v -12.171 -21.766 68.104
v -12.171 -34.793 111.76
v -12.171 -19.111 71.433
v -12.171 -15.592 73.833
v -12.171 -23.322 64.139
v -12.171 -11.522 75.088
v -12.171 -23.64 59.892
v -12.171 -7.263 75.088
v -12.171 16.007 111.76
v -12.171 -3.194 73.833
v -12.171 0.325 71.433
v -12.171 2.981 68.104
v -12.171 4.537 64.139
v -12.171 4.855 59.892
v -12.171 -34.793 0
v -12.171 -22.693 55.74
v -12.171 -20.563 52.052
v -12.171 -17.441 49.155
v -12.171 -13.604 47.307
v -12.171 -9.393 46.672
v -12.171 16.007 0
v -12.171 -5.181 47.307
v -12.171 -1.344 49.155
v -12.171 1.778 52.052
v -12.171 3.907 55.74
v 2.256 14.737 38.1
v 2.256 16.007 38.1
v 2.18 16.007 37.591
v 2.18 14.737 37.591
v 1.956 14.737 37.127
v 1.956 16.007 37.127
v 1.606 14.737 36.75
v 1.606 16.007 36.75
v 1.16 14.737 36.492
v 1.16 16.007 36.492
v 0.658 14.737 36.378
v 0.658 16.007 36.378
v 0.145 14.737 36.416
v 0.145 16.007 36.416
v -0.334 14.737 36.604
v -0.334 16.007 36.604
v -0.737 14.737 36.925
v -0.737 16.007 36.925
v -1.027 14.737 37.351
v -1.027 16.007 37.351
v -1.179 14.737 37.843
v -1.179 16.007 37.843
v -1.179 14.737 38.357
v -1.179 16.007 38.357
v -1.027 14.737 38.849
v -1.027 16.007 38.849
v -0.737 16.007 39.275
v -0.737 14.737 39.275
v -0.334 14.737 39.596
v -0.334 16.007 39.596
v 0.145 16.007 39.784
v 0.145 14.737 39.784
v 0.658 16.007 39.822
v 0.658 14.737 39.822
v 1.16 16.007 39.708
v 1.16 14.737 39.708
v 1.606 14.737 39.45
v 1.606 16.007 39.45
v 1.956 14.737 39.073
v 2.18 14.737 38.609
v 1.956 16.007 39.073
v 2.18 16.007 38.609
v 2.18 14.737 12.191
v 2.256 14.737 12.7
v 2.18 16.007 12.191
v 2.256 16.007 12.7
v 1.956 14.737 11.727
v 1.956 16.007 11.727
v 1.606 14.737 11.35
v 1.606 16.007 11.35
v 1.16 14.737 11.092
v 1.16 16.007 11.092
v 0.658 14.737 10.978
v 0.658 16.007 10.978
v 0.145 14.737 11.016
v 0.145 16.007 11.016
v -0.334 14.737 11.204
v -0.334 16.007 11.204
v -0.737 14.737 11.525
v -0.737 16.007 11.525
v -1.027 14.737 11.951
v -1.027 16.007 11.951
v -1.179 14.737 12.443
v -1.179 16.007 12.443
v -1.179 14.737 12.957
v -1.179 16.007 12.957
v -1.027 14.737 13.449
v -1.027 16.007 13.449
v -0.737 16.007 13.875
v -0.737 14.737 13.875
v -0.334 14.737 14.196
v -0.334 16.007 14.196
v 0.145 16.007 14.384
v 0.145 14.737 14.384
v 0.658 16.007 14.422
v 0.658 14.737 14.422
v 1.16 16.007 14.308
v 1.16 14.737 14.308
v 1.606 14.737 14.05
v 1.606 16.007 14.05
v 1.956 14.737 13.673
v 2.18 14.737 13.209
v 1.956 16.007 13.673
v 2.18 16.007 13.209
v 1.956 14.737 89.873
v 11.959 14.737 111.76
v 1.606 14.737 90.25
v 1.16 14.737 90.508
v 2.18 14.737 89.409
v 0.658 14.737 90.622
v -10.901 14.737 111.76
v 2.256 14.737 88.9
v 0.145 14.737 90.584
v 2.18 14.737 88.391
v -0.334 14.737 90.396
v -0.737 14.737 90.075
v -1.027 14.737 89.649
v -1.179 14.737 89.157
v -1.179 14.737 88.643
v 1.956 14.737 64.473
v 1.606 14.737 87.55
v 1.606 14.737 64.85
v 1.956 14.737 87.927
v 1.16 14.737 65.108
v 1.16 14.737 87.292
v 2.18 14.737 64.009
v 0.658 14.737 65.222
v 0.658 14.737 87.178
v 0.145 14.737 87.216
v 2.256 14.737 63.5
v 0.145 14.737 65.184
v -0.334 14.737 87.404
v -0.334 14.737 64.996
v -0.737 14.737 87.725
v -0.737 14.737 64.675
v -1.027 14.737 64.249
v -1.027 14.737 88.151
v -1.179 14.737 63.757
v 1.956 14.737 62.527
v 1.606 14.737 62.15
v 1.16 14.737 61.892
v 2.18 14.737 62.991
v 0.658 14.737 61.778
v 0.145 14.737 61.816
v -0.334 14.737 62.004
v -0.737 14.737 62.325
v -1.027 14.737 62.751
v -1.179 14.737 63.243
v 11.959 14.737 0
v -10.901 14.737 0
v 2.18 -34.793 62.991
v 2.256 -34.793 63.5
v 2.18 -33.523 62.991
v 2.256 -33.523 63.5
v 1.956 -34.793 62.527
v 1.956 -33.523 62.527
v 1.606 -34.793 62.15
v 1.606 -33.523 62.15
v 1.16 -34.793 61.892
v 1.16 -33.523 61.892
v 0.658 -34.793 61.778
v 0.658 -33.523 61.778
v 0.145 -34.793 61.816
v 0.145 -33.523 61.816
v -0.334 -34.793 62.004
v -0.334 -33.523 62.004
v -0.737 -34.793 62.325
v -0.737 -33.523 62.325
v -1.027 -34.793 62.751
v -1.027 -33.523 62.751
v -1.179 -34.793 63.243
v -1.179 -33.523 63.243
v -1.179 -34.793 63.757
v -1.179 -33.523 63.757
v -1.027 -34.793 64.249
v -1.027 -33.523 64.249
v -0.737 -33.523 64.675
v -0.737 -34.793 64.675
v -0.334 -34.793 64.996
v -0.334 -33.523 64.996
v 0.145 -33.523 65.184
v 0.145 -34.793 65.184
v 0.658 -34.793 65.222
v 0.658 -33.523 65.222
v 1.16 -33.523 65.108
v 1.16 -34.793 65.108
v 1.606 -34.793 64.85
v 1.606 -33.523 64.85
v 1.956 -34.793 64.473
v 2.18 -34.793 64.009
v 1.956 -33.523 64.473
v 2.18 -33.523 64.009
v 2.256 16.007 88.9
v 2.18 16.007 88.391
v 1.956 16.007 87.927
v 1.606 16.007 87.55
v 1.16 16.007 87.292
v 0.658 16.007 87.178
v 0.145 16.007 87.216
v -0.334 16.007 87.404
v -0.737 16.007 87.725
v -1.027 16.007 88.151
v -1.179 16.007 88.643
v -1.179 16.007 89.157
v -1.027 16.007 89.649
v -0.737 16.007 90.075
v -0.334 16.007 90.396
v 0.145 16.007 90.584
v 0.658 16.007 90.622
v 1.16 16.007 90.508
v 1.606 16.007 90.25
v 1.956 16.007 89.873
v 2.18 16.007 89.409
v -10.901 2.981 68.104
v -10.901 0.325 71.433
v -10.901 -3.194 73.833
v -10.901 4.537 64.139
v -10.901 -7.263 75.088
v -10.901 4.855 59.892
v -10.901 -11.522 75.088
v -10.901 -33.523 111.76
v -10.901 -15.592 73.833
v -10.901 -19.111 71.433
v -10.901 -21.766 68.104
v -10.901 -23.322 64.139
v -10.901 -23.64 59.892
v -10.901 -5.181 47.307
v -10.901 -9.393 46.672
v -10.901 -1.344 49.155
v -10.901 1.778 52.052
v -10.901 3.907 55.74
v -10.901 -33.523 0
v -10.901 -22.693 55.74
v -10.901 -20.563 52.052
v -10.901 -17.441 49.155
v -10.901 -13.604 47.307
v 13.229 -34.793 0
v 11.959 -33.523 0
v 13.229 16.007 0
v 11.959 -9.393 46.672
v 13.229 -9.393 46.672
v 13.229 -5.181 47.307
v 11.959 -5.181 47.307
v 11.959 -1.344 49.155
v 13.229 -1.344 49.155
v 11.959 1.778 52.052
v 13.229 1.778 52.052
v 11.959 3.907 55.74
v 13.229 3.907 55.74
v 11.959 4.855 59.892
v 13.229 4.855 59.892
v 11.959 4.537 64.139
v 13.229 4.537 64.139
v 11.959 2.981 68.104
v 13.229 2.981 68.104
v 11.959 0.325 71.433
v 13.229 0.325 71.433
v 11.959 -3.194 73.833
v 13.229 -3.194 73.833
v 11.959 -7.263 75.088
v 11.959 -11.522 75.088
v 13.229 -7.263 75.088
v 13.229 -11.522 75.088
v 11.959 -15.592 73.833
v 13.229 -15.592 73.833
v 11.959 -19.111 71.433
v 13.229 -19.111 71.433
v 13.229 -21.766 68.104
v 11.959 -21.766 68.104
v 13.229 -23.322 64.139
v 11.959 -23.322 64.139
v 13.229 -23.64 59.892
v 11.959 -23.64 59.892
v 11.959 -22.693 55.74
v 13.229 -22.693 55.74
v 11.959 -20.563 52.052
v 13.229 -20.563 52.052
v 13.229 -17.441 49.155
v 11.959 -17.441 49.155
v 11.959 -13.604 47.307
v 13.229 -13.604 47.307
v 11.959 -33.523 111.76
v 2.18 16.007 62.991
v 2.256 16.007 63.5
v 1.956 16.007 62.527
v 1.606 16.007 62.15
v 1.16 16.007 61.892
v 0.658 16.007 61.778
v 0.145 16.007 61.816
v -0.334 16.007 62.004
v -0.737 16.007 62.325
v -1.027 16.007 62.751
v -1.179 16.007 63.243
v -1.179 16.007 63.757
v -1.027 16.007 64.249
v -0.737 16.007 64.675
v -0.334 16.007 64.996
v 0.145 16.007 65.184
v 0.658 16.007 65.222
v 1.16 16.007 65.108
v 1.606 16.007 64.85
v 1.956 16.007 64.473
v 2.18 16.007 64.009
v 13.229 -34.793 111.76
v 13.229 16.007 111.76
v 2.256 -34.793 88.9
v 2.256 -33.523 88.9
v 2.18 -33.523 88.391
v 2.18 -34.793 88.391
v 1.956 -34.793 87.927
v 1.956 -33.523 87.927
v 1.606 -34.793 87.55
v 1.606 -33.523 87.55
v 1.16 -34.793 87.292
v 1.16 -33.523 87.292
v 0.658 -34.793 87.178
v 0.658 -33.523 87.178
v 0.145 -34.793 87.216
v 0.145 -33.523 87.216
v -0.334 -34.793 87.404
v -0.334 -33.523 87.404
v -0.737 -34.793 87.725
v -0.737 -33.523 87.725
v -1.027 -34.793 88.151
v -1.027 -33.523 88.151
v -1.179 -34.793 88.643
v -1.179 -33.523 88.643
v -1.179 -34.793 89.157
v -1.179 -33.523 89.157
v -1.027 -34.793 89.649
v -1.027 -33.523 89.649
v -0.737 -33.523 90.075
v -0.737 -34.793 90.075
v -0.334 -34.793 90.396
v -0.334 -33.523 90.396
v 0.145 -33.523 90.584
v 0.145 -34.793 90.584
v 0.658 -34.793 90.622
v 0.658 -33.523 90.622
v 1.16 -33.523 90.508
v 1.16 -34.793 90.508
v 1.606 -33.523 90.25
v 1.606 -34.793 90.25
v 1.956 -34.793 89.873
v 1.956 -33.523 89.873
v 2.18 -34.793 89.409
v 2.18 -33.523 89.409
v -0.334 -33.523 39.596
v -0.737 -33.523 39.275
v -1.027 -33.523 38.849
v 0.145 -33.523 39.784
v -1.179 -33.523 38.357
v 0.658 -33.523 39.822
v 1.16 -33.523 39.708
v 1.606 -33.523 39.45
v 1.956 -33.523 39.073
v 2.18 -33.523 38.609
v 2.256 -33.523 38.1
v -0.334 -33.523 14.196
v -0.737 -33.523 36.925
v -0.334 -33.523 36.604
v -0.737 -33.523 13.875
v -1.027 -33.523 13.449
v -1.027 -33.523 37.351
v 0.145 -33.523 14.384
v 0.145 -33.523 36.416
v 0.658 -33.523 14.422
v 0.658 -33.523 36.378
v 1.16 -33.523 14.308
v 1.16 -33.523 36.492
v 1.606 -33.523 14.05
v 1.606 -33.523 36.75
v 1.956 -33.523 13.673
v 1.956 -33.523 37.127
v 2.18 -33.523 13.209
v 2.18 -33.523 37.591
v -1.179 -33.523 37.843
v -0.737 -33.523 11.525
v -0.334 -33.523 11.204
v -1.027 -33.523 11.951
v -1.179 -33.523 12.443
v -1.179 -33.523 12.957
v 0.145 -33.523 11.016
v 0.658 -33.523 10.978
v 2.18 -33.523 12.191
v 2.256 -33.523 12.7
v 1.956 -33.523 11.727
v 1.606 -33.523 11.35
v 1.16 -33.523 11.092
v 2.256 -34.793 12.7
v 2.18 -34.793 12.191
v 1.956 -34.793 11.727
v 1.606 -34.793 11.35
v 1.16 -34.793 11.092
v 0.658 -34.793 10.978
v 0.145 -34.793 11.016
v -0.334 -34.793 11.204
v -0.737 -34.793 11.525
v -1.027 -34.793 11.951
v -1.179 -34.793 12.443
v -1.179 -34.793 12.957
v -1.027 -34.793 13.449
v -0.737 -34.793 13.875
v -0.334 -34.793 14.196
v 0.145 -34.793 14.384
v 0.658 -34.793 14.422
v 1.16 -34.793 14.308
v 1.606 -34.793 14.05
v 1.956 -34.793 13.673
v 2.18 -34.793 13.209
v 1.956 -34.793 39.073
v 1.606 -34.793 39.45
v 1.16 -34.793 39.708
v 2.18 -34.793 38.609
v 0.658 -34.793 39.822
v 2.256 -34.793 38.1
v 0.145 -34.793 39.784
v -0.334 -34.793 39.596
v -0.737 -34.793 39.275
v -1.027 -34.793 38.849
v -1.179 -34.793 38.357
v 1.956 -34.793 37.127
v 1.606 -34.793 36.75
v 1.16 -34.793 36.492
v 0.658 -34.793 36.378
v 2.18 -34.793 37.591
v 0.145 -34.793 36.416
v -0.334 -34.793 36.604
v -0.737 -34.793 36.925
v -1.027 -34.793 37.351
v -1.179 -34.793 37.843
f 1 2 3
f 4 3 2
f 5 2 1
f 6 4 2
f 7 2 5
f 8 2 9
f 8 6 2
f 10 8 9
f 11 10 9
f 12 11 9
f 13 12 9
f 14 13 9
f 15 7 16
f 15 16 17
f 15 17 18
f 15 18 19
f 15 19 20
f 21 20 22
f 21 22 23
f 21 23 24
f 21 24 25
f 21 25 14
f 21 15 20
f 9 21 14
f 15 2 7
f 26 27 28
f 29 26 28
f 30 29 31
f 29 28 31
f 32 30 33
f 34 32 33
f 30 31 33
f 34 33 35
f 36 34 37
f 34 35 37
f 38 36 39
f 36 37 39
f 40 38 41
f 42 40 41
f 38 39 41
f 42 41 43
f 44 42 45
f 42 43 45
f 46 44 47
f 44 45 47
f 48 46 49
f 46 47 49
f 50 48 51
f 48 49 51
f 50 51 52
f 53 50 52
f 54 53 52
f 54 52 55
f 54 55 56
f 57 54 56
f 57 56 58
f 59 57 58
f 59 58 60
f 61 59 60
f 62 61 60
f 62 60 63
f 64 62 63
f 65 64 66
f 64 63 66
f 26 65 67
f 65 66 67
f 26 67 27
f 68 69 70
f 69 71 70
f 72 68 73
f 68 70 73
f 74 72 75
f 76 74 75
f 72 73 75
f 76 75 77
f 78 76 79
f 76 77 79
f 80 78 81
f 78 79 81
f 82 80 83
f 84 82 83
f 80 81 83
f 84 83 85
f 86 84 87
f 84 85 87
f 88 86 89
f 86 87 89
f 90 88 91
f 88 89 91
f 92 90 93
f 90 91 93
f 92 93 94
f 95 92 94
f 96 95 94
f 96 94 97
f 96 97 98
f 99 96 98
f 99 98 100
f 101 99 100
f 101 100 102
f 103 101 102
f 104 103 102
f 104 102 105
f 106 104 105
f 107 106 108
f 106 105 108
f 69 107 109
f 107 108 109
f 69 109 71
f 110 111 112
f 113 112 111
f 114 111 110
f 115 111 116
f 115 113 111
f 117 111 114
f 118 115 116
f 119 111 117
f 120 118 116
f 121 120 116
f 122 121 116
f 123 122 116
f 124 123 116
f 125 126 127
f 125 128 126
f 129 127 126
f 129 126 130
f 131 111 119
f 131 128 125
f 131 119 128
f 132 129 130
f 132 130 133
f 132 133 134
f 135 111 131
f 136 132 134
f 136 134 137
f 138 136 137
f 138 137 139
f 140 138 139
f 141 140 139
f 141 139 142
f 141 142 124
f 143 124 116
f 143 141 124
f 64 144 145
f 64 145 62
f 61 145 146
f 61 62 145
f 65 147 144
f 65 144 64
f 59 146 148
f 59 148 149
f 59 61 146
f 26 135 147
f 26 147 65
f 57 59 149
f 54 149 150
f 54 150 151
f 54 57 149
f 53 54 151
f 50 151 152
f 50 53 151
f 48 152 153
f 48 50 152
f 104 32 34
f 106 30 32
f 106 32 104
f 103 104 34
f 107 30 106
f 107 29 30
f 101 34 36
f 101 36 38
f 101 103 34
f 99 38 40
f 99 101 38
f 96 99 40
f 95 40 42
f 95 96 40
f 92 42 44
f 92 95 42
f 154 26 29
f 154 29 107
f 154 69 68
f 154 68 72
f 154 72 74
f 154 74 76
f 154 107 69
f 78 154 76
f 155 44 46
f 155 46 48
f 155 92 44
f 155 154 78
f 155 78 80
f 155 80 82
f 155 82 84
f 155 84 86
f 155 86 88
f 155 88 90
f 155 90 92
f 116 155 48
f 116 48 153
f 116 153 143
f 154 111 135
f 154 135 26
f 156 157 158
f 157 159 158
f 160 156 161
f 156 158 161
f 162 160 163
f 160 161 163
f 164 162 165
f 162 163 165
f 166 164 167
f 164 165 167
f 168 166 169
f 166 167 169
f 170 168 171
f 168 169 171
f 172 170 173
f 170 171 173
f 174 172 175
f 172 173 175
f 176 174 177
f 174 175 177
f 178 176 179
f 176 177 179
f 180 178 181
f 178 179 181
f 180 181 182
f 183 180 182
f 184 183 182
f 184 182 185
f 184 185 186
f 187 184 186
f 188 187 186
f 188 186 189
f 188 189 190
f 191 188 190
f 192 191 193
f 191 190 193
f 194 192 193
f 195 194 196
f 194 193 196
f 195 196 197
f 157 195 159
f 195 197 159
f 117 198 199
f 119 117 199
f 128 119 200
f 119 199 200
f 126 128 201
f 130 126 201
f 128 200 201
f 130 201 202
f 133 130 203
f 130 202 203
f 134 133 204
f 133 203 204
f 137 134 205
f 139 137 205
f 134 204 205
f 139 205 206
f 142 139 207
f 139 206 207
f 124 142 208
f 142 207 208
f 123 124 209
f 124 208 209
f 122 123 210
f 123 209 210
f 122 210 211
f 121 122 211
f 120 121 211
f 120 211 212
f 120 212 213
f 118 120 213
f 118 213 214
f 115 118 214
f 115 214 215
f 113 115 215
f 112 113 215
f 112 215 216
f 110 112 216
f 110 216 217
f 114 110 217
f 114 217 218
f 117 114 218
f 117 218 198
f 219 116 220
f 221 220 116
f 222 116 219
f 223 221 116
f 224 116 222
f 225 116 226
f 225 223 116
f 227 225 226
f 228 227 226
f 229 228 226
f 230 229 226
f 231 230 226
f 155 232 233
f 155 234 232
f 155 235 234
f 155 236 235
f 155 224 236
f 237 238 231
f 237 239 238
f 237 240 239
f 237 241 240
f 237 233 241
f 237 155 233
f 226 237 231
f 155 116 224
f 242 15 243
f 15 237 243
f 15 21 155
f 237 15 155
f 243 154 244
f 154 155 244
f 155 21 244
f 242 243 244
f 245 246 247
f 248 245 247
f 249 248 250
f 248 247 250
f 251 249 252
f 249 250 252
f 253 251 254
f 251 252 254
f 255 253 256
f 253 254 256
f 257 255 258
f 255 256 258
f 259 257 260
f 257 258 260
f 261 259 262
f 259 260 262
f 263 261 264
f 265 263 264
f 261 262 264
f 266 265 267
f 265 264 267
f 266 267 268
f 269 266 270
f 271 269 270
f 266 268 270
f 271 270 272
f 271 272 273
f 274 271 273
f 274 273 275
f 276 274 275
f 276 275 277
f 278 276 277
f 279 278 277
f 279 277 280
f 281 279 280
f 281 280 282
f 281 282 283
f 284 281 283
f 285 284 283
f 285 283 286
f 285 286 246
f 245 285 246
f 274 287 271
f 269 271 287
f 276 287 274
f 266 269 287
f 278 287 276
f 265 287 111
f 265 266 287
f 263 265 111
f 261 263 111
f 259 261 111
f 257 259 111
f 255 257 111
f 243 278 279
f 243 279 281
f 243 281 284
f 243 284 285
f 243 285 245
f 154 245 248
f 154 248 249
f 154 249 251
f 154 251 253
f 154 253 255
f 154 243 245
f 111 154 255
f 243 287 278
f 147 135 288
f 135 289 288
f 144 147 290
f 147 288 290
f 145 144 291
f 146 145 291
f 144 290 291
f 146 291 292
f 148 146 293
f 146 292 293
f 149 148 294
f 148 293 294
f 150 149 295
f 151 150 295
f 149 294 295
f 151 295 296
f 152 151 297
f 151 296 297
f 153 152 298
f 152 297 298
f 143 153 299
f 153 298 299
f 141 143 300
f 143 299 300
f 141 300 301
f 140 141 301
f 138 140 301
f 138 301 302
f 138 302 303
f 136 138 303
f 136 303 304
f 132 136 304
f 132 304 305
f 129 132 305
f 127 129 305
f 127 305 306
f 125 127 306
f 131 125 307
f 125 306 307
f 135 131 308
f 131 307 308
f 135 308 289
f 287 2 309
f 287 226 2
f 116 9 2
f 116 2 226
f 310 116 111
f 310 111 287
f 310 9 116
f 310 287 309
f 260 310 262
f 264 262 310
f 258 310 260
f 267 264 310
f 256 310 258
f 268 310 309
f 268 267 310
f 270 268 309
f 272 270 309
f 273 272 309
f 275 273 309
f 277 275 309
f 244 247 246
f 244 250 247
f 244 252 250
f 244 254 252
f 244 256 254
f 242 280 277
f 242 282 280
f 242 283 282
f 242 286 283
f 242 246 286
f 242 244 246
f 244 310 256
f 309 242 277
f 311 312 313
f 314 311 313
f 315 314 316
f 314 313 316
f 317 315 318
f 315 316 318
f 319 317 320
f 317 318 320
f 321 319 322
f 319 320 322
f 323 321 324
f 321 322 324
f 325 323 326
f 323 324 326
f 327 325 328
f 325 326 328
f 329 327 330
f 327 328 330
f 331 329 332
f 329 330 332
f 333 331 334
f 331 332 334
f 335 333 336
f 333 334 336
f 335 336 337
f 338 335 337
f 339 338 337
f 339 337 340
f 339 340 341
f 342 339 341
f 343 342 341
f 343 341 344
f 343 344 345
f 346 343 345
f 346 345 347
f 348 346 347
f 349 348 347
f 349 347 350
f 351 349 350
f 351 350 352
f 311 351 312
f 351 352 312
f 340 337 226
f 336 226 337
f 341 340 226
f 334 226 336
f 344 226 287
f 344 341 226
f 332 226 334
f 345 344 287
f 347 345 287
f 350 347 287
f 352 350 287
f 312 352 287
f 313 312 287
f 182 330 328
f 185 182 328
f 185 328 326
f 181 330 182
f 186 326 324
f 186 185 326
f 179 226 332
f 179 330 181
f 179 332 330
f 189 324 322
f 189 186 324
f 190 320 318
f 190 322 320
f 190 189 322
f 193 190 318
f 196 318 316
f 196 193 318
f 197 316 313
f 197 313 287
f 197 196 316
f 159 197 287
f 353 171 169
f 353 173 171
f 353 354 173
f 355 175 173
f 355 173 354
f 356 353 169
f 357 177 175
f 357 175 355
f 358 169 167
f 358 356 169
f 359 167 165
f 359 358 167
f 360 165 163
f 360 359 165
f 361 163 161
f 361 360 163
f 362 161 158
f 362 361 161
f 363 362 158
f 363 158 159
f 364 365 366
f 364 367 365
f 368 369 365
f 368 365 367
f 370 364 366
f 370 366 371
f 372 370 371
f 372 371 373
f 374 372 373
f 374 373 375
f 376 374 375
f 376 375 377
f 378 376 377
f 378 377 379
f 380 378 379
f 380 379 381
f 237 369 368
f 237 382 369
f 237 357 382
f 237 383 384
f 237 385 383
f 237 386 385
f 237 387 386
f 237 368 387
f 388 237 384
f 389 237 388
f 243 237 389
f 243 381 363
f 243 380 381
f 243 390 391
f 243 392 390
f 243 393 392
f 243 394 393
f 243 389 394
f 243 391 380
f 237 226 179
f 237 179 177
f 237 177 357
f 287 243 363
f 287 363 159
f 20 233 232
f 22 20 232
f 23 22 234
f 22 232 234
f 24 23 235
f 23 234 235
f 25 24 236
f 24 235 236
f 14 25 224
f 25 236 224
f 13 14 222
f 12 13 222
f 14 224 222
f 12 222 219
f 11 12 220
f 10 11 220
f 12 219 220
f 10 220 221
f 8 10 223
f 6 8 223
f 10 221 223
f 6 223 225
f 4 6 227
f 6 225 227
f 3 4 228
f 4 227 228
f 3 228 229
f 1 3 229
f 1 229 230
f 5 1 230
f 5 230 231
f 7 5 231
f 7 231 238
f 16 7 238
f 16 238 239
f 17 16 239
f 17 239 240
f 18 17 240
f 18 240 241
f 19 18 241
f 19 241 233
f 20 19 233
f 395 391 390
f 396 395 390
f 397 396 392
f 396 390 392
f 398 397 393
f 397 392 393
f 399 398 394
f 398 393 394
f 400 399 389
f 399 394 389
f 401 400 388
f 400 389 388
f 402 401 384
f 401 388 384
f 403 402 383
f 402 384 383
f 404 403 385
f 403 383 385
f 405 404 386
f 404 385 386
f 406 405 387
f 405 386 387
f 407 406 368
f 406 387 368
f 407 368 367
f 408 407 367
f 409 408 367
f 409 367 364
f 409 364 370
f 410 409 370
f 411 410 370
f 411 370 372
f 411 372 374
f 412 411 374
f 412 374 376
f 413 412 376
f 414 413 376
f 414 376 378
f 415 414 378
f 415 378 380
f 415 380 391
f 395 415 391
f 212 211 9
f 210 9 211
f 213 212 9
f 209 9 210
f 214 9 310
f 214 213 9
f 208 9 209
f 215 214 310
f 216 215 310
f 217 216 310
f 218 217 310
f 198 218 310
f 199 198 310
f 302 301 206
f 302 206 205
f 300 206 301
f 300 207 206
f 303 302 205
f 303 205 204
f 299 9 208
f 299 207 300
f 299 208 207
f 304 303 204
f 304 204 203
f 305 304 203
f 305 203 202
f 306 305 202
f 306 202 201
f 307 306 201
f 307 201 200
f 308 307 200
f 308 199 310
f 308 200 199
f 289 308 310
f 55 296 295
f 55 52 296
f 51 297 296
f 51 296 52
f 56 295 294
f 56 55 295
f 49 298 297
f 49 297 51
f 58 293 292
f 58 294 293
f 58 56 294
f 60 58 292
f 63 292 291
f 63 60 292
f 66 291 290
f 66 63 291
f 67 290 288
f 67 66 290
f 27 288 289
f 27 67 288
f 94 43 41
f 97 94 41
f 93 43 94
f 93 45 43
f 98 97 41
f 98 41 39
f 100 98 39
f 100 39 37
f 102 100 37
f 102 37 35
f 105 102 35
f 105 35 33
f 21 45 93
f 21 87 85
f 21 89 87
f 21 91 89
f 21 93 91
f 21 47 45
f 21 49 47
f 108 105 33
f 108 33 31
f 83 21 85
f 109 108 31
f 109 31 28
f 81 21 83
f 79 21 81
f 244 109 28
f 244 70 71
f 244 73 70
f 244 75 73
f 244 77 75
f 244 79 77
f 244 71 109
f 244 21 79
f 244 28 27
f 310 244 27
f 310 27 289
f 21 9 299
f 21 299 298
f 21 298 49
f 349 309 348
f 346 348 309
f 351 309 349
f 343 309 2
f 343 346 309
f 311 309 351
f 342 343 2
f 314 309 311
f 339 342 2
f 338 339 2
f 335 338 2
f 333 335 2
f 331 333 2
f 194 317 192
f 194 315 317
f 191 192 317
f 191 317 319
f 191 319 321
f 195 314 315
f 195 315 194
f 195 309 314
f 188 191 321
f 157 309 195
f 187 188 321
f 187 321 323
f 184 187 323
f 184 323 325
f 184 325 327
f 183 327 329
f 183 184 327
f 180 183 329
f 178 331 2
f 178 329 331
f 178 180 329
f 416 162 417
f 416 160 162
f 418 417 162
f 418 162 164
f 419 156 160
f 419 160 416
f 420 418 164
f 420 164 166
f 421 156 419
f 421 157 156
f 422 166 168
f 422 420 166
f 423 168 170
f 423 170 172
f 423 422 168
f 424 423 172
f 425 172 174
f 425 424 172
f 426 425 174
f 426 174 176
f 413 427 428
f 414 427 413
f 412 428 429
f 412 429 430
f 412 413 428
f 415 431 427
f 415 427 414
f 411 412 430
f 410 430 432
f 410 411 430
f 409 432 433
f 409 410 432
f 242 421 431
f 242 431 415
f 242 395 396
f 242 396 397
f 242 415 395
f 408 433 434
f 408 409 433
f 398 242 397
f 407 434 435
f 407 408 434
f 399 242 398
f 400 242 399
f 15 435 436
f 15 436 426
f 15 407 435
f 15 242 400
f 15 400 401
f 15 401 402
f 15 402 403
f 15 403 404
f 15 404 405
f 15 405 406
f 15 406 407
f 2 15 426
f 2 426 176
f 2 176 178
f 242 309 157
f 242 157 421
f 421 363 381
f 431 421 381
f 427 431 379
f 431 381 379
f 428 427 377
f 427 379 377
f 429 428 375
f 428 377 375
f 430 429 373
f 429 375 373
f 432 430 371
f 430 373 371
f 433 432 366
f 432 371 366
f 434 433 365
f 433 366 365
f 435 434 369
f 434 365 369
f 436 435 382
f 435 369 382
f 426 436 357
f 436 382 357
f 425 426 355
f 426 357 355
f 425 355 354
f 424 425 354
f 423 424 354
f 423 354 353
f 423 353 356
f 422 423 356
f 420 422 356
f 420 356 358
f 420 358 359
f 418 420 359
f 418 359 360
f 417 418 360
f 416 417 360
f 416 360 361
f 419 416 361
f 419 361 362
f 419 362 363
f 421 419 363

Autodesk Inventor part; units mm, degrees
ref_plane "YZ Plane" through (0, 0, 0) normal (1, 0, 0) x (0, 1, 0)
ref_plane "XZ Plane" through (0, 0, 0) normal (0, 1, 0) x (-1, 0, 0)
ref_plane "XY Plane" through (0, 0, 0) normal (0, 0, 1) x (1, 0, 0)
sketch "Sketch1" plane through (0, 0, 0) normal (0, 0, 1) x (1, 0, 0)
  line L0 (-12.1708, 16.0073) -> (13.2292, 16.0073)
  line L1 (13.2292, 16.0073) -> (13.2292, -34.7927)
  line L2 (13.2292, -34.7927) -> (-12.1708, -34.7927)
  line L3 (-12.1708, -34.7927) -> (-12.1708, 16.0073)
  line L4 (11.9592, 14.7373) -> (-10.9008, 14.7373)
  line L5 (-10.9008, 14.7373) -> (-10.9008, -33.5227)
  line L6 (-10.9008, -33.5227) -> (11.9592, -33.5227)
  line L7 (11.9592, -33.5227) -> (11.9592, 14.7373)
  point P0 (0, 0)
  dimension "d0" = 25.4
  dimension "d1" = 50.8
  dimension "d2" = 1.27
extrude "Extrusion1" add sketch "Sketch1" along normal blind 111.76
sketch "Sketch2" plane through (-12.1708, 16.0073, 0) normal (0, 1, 0) x (1, 0, 0)
  circle A0 centre (12.7, -12.7) radius 1.7272
  line L0 (25.4, 0) -> (0, 0) projected
  line L1 (0, 0) -> (0, -111.76) projected
  point P0 (12.1708, 0)
  dimension "d5" = 3.4544
  dimension "d6" = 12.7
  dimension "d7" = 12.7
extrude "Extrusion2" cut sketch "Sketch2" against normal through all
pattern_linear "Rectangular Pattern1" count 11 spacing 25.4 along (0, 0, 1) of "Extrusion2"
sketch "Sketch3" plane through (13.2292, -34.7927, 0) normal (1, 0, 0) x (0, 0, -1)
  circle A0 centre (-60.96, 25.4) radius 14.2875
  line L0 (0, 0) -> (-111.76, 0) projected
  line L1 (-111.76, 0) -> (-111.76, 50.8) projected
  point P0 (0, 34.7927)
  dimension "d15" = 25.4
  dimension "d16" = 50.8
  dimension "d17" = 28.575
extrude "Extrusion3" cut sketch "Sketch3" against normal through all
equation "\"d3\" = d13"
equation "\"d10\" = d14"
equation "\"d13\" = 111.76"
equation "\"d14\" = d13"
properties part number "Test  Stock Rotation extender"
